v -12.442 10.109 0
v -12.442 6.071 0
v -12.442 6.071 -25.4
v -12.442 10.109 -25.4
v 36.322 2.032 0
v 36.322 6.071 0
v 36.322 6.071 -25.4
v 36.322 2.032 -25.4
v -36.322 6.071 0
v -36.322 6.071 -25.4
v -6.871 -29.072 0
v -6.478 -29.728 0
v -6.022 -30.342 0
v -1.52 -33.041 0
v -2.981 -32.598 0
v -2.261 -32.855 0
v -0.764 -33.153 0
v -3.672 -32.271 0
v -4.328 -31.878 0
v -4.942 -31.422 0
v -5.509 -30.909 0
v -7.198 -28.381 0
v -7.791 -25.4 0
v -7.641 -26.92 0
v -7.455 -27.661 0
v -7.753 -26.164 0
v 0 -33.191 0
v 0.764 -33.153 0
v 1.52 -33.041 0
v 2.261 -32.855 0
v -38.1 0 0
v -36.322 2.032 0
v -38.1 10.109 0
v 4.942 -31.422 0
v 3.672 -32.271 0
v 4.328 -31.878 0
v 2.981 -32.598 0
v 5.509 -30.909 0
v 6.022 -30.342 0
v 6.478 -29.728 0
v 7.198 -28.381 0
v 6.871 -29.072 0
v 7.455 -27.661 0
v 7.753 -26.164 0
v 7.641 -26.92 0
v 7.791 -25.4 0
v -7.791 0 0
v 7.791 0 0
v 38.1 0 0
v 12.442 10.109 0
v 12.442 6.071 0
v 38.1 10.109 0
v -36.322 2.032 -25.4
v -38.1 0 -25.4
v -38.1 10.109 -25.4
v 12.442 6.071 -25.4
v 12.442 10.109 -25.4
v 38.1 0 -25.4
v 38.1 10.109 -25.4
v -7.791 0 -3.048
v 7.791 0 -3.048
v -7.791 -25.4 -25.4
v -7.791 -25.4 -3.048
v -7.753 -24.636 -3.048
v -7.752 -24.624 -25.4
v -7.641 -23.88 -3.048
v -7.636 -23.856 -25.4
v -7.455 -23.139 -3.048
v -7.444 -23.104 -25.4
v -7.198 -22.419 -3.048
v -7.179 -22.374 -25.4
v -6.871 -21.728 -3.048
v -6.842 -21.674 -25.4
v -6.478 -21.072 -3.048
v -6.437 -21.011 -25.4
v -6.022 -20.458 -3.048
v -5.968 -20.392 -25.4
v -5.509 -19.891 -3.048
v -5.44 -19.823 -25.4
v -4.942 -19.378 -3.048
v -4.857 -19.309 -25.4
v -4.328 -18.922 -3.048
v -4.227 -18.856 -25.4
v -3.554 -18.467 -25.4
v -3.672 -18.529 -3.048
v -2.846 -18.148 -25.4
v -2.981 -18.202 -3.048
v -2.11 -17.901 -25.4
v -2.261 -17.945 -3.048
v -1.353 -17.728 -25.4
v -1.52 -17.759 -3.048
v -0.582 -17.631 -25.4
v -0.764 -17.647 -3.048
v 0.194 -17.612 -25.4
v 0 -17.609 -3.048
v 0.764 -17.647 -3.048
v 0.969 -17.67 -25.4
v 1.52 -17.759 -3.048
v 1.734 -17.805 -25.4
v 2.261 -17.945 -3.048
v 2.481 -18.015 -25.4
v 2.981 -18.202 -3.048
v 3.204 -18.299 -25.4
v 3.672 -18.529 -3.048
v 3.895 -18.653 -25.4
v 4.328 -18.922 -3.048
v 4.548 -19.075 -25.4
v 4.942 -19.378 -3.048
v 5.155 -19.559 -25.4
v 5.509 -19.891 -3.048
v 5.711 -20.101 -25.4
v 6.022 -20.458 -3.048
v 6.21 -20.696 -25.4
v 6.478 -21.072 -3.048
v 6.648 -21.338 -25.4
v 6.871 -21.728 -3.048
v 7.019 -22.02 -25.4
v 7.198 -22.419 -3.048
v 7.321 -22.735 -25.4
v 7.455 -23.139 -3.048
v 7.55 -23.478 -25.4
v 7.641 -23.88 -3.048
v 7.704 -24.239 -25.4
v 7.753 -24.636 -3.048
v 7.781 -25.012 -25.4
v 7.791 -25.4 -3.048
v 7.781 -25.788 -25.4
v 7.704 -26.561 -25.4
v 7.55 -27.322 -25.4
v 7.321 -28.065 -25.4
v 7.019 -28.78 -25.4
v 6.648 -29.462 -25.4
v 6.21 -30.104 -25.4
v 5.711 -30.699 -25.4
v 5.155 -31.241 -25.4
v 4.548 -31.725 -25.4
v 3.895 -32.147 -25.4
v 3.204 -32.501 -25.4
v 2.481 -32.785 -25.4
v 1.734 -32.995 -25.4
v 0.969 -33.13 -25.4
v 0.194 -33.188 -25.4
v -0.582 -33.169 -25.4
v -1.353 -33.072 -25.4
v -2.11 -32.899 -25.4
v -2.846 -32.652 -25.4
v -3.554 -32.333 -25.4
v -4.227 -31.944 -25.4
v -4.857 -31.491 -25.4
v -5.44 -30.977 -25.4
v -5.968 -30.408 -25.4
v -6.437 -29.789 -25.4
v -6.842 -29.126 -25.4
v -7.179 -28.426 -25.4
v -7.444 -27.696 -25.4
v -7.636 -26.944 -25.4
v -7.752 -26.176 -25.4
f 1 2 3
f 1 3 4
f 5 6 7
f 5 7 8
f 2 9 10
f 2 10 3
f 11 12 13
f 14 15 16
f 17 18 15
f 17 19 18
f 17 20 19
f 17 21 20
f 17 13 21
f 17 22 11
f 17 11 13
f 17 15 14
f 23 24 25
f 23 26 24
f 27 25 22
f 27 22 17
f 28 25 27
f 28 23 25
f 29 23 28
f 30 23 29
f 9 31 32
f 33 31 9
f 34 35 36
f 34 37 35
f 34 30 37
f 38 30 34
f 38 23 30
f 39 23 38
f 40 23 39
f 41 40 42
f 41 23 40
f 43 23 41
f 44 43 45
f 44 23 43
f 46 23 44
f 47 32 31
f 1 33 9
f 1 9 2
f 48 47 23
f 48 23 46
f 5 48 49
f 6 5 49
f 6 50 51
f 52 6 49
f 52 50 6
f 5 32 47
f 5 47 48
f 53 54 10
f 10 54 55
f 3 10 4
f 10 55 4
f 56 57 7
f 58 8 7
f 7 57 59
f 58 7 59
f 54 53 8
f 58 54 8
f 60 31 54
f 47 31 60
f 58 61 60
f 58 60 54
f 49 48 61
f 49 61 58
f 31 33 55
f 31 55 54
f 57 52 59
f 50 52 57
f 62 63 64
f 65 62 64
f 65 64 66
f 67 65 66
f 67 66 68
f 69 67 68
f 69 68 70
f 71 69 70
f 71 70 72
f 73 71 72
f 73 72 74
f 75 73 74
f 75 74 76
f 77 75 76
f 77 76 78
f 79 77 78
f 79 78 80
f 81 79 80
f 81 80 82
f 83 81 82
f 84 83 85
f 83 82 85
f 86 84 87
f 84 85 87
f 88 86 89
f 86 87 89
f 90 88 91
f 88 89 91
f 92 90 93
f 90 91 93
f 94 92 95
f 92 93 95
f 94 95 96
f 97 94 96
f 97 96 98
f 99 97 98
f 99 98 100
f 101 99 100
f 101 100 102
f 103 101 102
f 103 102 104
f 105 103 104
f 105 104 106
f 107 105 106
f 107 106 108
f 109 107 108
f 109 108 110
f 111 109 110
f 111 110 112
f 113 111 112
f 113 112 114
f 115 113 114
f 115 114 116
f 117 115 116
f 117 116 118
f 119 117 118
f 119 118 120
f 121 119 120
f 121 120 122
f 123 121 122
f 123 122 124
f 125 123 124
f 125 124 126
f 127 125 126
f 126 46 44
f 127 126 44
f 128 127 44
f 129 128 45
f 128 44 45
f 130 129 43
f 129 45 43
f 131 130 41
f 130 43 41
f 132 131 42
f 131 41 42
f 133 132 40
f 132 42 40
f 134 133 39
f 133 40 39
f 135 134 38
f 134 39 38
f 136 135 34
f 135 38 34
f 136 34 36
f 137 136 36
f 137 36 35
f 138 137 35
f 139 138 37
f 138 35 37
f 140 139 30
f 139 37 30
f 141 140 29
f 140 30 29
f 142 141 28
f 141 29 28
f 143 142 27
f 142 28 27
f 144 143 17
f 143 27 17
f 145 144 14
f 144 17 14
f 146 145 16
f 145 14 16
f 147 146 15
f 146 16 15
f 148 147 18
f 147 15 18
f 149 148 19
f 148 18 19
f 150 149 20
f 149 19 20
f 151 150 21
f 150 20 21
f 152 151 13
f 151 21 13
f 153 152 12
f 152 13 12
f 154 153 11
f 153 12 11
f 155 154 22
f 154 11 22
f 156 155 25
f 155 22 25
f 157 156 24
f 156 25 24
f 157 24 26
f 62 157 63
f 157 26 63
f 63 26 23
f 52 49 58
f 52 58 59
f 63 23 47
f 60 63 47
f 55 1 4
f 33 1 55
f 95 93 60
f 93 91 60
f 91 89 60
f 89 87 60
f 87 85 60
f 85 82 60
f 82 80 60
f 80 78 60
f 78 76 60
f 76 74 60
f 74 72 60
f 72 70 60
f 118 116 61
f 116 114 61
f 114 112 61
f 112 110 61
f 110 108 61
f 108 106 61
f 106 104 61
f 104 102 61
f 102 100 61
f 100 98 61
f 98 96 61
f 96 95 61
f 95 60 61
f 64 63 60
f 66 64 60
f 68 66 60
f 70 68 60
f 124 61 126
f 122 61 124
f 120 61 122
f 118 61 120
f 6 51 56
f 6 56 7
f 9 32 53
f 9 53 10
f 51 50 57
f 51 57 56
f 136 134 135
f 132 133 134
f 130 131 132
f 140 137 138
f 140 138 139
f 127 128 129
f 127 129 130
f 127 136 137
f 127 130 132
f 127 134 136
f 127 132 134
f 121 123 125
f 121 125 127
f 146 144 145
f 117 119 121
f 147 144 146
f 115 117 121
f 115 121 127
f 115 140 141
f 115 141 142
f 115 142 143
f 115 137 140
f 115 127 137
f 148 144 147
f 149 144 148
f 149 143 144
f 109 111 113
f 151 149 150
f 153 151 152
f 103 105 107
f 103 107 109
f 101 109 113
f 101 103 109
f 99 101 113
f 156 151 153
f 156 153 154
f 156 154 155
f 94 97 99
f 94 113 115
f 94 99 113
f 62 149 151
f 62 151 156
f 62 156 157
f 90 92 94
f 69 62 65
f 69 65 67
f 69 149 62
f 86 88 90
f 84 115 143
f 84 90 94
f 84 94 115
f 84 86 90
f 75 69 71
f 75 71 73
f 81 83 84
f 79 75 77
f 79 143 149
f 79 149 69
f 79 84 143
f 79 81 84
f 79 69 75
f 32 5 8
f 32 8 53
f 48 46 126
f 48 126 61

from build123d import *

# Parameters (mm, degrees)
BOSS_EXTRUDE1_DEPTH = 25.4
SKETCH2_W           = 7.790615149
SKETCH2_H           = 25.4
BOSS_EXTRUDE2_DEPTH = 3.048
SKETCH3_R           = 7.790615149
BOSS_EXTRUDE3_DEPTH = 25.4


with BuildPart() as part:
    # Sketch1 → Boss-Extrude1 (new body)
    with BuildSketch(Plane.XY):
        Polygon((-38.1, 0), (38.1, 0), (38.1, 10.1092), (12.442422535, 10.1092), (12.442422535, 6.0706), (36.322, 6.0706), (36.322, 2.032), (-36.322, 2.032), (-36.322, 6.0706), (-12.442422535, 6.0706), (-12.442422535, 10.1092), (-38.1, 10.1092), align=None)
    extrude(amount=-BOSS_EXTRUDE1_DEPTH)

    # Sketch2 → Boss-Extrude2 (add)
    with BuildSketch(Plane.XY):
        with Locations((-3.895307575, -12.7)):
            Rectangle(SKETCH2_W, SKETCH2_H)
        with Locations((3.895307575, -12.7)):
            Rectangle(SKETCH2_W, SKETCH2_H)
    extrude(amount=-BOSS_EXTRUDE2_DEPTH)

    # Sketch3 → Boss-Extrude3 (add)
    with BuildSketch(Plane(origin=(0, 0, 0), x_dir=(-1, 0, 0), z_dir=(0, 0, -1))):
        with Locations((0, -25.4)):
            Circle(SKETCH3_R)
    extrude(amount=BOSS_EXTRUDE3_DEPTH)


solid = part.part
